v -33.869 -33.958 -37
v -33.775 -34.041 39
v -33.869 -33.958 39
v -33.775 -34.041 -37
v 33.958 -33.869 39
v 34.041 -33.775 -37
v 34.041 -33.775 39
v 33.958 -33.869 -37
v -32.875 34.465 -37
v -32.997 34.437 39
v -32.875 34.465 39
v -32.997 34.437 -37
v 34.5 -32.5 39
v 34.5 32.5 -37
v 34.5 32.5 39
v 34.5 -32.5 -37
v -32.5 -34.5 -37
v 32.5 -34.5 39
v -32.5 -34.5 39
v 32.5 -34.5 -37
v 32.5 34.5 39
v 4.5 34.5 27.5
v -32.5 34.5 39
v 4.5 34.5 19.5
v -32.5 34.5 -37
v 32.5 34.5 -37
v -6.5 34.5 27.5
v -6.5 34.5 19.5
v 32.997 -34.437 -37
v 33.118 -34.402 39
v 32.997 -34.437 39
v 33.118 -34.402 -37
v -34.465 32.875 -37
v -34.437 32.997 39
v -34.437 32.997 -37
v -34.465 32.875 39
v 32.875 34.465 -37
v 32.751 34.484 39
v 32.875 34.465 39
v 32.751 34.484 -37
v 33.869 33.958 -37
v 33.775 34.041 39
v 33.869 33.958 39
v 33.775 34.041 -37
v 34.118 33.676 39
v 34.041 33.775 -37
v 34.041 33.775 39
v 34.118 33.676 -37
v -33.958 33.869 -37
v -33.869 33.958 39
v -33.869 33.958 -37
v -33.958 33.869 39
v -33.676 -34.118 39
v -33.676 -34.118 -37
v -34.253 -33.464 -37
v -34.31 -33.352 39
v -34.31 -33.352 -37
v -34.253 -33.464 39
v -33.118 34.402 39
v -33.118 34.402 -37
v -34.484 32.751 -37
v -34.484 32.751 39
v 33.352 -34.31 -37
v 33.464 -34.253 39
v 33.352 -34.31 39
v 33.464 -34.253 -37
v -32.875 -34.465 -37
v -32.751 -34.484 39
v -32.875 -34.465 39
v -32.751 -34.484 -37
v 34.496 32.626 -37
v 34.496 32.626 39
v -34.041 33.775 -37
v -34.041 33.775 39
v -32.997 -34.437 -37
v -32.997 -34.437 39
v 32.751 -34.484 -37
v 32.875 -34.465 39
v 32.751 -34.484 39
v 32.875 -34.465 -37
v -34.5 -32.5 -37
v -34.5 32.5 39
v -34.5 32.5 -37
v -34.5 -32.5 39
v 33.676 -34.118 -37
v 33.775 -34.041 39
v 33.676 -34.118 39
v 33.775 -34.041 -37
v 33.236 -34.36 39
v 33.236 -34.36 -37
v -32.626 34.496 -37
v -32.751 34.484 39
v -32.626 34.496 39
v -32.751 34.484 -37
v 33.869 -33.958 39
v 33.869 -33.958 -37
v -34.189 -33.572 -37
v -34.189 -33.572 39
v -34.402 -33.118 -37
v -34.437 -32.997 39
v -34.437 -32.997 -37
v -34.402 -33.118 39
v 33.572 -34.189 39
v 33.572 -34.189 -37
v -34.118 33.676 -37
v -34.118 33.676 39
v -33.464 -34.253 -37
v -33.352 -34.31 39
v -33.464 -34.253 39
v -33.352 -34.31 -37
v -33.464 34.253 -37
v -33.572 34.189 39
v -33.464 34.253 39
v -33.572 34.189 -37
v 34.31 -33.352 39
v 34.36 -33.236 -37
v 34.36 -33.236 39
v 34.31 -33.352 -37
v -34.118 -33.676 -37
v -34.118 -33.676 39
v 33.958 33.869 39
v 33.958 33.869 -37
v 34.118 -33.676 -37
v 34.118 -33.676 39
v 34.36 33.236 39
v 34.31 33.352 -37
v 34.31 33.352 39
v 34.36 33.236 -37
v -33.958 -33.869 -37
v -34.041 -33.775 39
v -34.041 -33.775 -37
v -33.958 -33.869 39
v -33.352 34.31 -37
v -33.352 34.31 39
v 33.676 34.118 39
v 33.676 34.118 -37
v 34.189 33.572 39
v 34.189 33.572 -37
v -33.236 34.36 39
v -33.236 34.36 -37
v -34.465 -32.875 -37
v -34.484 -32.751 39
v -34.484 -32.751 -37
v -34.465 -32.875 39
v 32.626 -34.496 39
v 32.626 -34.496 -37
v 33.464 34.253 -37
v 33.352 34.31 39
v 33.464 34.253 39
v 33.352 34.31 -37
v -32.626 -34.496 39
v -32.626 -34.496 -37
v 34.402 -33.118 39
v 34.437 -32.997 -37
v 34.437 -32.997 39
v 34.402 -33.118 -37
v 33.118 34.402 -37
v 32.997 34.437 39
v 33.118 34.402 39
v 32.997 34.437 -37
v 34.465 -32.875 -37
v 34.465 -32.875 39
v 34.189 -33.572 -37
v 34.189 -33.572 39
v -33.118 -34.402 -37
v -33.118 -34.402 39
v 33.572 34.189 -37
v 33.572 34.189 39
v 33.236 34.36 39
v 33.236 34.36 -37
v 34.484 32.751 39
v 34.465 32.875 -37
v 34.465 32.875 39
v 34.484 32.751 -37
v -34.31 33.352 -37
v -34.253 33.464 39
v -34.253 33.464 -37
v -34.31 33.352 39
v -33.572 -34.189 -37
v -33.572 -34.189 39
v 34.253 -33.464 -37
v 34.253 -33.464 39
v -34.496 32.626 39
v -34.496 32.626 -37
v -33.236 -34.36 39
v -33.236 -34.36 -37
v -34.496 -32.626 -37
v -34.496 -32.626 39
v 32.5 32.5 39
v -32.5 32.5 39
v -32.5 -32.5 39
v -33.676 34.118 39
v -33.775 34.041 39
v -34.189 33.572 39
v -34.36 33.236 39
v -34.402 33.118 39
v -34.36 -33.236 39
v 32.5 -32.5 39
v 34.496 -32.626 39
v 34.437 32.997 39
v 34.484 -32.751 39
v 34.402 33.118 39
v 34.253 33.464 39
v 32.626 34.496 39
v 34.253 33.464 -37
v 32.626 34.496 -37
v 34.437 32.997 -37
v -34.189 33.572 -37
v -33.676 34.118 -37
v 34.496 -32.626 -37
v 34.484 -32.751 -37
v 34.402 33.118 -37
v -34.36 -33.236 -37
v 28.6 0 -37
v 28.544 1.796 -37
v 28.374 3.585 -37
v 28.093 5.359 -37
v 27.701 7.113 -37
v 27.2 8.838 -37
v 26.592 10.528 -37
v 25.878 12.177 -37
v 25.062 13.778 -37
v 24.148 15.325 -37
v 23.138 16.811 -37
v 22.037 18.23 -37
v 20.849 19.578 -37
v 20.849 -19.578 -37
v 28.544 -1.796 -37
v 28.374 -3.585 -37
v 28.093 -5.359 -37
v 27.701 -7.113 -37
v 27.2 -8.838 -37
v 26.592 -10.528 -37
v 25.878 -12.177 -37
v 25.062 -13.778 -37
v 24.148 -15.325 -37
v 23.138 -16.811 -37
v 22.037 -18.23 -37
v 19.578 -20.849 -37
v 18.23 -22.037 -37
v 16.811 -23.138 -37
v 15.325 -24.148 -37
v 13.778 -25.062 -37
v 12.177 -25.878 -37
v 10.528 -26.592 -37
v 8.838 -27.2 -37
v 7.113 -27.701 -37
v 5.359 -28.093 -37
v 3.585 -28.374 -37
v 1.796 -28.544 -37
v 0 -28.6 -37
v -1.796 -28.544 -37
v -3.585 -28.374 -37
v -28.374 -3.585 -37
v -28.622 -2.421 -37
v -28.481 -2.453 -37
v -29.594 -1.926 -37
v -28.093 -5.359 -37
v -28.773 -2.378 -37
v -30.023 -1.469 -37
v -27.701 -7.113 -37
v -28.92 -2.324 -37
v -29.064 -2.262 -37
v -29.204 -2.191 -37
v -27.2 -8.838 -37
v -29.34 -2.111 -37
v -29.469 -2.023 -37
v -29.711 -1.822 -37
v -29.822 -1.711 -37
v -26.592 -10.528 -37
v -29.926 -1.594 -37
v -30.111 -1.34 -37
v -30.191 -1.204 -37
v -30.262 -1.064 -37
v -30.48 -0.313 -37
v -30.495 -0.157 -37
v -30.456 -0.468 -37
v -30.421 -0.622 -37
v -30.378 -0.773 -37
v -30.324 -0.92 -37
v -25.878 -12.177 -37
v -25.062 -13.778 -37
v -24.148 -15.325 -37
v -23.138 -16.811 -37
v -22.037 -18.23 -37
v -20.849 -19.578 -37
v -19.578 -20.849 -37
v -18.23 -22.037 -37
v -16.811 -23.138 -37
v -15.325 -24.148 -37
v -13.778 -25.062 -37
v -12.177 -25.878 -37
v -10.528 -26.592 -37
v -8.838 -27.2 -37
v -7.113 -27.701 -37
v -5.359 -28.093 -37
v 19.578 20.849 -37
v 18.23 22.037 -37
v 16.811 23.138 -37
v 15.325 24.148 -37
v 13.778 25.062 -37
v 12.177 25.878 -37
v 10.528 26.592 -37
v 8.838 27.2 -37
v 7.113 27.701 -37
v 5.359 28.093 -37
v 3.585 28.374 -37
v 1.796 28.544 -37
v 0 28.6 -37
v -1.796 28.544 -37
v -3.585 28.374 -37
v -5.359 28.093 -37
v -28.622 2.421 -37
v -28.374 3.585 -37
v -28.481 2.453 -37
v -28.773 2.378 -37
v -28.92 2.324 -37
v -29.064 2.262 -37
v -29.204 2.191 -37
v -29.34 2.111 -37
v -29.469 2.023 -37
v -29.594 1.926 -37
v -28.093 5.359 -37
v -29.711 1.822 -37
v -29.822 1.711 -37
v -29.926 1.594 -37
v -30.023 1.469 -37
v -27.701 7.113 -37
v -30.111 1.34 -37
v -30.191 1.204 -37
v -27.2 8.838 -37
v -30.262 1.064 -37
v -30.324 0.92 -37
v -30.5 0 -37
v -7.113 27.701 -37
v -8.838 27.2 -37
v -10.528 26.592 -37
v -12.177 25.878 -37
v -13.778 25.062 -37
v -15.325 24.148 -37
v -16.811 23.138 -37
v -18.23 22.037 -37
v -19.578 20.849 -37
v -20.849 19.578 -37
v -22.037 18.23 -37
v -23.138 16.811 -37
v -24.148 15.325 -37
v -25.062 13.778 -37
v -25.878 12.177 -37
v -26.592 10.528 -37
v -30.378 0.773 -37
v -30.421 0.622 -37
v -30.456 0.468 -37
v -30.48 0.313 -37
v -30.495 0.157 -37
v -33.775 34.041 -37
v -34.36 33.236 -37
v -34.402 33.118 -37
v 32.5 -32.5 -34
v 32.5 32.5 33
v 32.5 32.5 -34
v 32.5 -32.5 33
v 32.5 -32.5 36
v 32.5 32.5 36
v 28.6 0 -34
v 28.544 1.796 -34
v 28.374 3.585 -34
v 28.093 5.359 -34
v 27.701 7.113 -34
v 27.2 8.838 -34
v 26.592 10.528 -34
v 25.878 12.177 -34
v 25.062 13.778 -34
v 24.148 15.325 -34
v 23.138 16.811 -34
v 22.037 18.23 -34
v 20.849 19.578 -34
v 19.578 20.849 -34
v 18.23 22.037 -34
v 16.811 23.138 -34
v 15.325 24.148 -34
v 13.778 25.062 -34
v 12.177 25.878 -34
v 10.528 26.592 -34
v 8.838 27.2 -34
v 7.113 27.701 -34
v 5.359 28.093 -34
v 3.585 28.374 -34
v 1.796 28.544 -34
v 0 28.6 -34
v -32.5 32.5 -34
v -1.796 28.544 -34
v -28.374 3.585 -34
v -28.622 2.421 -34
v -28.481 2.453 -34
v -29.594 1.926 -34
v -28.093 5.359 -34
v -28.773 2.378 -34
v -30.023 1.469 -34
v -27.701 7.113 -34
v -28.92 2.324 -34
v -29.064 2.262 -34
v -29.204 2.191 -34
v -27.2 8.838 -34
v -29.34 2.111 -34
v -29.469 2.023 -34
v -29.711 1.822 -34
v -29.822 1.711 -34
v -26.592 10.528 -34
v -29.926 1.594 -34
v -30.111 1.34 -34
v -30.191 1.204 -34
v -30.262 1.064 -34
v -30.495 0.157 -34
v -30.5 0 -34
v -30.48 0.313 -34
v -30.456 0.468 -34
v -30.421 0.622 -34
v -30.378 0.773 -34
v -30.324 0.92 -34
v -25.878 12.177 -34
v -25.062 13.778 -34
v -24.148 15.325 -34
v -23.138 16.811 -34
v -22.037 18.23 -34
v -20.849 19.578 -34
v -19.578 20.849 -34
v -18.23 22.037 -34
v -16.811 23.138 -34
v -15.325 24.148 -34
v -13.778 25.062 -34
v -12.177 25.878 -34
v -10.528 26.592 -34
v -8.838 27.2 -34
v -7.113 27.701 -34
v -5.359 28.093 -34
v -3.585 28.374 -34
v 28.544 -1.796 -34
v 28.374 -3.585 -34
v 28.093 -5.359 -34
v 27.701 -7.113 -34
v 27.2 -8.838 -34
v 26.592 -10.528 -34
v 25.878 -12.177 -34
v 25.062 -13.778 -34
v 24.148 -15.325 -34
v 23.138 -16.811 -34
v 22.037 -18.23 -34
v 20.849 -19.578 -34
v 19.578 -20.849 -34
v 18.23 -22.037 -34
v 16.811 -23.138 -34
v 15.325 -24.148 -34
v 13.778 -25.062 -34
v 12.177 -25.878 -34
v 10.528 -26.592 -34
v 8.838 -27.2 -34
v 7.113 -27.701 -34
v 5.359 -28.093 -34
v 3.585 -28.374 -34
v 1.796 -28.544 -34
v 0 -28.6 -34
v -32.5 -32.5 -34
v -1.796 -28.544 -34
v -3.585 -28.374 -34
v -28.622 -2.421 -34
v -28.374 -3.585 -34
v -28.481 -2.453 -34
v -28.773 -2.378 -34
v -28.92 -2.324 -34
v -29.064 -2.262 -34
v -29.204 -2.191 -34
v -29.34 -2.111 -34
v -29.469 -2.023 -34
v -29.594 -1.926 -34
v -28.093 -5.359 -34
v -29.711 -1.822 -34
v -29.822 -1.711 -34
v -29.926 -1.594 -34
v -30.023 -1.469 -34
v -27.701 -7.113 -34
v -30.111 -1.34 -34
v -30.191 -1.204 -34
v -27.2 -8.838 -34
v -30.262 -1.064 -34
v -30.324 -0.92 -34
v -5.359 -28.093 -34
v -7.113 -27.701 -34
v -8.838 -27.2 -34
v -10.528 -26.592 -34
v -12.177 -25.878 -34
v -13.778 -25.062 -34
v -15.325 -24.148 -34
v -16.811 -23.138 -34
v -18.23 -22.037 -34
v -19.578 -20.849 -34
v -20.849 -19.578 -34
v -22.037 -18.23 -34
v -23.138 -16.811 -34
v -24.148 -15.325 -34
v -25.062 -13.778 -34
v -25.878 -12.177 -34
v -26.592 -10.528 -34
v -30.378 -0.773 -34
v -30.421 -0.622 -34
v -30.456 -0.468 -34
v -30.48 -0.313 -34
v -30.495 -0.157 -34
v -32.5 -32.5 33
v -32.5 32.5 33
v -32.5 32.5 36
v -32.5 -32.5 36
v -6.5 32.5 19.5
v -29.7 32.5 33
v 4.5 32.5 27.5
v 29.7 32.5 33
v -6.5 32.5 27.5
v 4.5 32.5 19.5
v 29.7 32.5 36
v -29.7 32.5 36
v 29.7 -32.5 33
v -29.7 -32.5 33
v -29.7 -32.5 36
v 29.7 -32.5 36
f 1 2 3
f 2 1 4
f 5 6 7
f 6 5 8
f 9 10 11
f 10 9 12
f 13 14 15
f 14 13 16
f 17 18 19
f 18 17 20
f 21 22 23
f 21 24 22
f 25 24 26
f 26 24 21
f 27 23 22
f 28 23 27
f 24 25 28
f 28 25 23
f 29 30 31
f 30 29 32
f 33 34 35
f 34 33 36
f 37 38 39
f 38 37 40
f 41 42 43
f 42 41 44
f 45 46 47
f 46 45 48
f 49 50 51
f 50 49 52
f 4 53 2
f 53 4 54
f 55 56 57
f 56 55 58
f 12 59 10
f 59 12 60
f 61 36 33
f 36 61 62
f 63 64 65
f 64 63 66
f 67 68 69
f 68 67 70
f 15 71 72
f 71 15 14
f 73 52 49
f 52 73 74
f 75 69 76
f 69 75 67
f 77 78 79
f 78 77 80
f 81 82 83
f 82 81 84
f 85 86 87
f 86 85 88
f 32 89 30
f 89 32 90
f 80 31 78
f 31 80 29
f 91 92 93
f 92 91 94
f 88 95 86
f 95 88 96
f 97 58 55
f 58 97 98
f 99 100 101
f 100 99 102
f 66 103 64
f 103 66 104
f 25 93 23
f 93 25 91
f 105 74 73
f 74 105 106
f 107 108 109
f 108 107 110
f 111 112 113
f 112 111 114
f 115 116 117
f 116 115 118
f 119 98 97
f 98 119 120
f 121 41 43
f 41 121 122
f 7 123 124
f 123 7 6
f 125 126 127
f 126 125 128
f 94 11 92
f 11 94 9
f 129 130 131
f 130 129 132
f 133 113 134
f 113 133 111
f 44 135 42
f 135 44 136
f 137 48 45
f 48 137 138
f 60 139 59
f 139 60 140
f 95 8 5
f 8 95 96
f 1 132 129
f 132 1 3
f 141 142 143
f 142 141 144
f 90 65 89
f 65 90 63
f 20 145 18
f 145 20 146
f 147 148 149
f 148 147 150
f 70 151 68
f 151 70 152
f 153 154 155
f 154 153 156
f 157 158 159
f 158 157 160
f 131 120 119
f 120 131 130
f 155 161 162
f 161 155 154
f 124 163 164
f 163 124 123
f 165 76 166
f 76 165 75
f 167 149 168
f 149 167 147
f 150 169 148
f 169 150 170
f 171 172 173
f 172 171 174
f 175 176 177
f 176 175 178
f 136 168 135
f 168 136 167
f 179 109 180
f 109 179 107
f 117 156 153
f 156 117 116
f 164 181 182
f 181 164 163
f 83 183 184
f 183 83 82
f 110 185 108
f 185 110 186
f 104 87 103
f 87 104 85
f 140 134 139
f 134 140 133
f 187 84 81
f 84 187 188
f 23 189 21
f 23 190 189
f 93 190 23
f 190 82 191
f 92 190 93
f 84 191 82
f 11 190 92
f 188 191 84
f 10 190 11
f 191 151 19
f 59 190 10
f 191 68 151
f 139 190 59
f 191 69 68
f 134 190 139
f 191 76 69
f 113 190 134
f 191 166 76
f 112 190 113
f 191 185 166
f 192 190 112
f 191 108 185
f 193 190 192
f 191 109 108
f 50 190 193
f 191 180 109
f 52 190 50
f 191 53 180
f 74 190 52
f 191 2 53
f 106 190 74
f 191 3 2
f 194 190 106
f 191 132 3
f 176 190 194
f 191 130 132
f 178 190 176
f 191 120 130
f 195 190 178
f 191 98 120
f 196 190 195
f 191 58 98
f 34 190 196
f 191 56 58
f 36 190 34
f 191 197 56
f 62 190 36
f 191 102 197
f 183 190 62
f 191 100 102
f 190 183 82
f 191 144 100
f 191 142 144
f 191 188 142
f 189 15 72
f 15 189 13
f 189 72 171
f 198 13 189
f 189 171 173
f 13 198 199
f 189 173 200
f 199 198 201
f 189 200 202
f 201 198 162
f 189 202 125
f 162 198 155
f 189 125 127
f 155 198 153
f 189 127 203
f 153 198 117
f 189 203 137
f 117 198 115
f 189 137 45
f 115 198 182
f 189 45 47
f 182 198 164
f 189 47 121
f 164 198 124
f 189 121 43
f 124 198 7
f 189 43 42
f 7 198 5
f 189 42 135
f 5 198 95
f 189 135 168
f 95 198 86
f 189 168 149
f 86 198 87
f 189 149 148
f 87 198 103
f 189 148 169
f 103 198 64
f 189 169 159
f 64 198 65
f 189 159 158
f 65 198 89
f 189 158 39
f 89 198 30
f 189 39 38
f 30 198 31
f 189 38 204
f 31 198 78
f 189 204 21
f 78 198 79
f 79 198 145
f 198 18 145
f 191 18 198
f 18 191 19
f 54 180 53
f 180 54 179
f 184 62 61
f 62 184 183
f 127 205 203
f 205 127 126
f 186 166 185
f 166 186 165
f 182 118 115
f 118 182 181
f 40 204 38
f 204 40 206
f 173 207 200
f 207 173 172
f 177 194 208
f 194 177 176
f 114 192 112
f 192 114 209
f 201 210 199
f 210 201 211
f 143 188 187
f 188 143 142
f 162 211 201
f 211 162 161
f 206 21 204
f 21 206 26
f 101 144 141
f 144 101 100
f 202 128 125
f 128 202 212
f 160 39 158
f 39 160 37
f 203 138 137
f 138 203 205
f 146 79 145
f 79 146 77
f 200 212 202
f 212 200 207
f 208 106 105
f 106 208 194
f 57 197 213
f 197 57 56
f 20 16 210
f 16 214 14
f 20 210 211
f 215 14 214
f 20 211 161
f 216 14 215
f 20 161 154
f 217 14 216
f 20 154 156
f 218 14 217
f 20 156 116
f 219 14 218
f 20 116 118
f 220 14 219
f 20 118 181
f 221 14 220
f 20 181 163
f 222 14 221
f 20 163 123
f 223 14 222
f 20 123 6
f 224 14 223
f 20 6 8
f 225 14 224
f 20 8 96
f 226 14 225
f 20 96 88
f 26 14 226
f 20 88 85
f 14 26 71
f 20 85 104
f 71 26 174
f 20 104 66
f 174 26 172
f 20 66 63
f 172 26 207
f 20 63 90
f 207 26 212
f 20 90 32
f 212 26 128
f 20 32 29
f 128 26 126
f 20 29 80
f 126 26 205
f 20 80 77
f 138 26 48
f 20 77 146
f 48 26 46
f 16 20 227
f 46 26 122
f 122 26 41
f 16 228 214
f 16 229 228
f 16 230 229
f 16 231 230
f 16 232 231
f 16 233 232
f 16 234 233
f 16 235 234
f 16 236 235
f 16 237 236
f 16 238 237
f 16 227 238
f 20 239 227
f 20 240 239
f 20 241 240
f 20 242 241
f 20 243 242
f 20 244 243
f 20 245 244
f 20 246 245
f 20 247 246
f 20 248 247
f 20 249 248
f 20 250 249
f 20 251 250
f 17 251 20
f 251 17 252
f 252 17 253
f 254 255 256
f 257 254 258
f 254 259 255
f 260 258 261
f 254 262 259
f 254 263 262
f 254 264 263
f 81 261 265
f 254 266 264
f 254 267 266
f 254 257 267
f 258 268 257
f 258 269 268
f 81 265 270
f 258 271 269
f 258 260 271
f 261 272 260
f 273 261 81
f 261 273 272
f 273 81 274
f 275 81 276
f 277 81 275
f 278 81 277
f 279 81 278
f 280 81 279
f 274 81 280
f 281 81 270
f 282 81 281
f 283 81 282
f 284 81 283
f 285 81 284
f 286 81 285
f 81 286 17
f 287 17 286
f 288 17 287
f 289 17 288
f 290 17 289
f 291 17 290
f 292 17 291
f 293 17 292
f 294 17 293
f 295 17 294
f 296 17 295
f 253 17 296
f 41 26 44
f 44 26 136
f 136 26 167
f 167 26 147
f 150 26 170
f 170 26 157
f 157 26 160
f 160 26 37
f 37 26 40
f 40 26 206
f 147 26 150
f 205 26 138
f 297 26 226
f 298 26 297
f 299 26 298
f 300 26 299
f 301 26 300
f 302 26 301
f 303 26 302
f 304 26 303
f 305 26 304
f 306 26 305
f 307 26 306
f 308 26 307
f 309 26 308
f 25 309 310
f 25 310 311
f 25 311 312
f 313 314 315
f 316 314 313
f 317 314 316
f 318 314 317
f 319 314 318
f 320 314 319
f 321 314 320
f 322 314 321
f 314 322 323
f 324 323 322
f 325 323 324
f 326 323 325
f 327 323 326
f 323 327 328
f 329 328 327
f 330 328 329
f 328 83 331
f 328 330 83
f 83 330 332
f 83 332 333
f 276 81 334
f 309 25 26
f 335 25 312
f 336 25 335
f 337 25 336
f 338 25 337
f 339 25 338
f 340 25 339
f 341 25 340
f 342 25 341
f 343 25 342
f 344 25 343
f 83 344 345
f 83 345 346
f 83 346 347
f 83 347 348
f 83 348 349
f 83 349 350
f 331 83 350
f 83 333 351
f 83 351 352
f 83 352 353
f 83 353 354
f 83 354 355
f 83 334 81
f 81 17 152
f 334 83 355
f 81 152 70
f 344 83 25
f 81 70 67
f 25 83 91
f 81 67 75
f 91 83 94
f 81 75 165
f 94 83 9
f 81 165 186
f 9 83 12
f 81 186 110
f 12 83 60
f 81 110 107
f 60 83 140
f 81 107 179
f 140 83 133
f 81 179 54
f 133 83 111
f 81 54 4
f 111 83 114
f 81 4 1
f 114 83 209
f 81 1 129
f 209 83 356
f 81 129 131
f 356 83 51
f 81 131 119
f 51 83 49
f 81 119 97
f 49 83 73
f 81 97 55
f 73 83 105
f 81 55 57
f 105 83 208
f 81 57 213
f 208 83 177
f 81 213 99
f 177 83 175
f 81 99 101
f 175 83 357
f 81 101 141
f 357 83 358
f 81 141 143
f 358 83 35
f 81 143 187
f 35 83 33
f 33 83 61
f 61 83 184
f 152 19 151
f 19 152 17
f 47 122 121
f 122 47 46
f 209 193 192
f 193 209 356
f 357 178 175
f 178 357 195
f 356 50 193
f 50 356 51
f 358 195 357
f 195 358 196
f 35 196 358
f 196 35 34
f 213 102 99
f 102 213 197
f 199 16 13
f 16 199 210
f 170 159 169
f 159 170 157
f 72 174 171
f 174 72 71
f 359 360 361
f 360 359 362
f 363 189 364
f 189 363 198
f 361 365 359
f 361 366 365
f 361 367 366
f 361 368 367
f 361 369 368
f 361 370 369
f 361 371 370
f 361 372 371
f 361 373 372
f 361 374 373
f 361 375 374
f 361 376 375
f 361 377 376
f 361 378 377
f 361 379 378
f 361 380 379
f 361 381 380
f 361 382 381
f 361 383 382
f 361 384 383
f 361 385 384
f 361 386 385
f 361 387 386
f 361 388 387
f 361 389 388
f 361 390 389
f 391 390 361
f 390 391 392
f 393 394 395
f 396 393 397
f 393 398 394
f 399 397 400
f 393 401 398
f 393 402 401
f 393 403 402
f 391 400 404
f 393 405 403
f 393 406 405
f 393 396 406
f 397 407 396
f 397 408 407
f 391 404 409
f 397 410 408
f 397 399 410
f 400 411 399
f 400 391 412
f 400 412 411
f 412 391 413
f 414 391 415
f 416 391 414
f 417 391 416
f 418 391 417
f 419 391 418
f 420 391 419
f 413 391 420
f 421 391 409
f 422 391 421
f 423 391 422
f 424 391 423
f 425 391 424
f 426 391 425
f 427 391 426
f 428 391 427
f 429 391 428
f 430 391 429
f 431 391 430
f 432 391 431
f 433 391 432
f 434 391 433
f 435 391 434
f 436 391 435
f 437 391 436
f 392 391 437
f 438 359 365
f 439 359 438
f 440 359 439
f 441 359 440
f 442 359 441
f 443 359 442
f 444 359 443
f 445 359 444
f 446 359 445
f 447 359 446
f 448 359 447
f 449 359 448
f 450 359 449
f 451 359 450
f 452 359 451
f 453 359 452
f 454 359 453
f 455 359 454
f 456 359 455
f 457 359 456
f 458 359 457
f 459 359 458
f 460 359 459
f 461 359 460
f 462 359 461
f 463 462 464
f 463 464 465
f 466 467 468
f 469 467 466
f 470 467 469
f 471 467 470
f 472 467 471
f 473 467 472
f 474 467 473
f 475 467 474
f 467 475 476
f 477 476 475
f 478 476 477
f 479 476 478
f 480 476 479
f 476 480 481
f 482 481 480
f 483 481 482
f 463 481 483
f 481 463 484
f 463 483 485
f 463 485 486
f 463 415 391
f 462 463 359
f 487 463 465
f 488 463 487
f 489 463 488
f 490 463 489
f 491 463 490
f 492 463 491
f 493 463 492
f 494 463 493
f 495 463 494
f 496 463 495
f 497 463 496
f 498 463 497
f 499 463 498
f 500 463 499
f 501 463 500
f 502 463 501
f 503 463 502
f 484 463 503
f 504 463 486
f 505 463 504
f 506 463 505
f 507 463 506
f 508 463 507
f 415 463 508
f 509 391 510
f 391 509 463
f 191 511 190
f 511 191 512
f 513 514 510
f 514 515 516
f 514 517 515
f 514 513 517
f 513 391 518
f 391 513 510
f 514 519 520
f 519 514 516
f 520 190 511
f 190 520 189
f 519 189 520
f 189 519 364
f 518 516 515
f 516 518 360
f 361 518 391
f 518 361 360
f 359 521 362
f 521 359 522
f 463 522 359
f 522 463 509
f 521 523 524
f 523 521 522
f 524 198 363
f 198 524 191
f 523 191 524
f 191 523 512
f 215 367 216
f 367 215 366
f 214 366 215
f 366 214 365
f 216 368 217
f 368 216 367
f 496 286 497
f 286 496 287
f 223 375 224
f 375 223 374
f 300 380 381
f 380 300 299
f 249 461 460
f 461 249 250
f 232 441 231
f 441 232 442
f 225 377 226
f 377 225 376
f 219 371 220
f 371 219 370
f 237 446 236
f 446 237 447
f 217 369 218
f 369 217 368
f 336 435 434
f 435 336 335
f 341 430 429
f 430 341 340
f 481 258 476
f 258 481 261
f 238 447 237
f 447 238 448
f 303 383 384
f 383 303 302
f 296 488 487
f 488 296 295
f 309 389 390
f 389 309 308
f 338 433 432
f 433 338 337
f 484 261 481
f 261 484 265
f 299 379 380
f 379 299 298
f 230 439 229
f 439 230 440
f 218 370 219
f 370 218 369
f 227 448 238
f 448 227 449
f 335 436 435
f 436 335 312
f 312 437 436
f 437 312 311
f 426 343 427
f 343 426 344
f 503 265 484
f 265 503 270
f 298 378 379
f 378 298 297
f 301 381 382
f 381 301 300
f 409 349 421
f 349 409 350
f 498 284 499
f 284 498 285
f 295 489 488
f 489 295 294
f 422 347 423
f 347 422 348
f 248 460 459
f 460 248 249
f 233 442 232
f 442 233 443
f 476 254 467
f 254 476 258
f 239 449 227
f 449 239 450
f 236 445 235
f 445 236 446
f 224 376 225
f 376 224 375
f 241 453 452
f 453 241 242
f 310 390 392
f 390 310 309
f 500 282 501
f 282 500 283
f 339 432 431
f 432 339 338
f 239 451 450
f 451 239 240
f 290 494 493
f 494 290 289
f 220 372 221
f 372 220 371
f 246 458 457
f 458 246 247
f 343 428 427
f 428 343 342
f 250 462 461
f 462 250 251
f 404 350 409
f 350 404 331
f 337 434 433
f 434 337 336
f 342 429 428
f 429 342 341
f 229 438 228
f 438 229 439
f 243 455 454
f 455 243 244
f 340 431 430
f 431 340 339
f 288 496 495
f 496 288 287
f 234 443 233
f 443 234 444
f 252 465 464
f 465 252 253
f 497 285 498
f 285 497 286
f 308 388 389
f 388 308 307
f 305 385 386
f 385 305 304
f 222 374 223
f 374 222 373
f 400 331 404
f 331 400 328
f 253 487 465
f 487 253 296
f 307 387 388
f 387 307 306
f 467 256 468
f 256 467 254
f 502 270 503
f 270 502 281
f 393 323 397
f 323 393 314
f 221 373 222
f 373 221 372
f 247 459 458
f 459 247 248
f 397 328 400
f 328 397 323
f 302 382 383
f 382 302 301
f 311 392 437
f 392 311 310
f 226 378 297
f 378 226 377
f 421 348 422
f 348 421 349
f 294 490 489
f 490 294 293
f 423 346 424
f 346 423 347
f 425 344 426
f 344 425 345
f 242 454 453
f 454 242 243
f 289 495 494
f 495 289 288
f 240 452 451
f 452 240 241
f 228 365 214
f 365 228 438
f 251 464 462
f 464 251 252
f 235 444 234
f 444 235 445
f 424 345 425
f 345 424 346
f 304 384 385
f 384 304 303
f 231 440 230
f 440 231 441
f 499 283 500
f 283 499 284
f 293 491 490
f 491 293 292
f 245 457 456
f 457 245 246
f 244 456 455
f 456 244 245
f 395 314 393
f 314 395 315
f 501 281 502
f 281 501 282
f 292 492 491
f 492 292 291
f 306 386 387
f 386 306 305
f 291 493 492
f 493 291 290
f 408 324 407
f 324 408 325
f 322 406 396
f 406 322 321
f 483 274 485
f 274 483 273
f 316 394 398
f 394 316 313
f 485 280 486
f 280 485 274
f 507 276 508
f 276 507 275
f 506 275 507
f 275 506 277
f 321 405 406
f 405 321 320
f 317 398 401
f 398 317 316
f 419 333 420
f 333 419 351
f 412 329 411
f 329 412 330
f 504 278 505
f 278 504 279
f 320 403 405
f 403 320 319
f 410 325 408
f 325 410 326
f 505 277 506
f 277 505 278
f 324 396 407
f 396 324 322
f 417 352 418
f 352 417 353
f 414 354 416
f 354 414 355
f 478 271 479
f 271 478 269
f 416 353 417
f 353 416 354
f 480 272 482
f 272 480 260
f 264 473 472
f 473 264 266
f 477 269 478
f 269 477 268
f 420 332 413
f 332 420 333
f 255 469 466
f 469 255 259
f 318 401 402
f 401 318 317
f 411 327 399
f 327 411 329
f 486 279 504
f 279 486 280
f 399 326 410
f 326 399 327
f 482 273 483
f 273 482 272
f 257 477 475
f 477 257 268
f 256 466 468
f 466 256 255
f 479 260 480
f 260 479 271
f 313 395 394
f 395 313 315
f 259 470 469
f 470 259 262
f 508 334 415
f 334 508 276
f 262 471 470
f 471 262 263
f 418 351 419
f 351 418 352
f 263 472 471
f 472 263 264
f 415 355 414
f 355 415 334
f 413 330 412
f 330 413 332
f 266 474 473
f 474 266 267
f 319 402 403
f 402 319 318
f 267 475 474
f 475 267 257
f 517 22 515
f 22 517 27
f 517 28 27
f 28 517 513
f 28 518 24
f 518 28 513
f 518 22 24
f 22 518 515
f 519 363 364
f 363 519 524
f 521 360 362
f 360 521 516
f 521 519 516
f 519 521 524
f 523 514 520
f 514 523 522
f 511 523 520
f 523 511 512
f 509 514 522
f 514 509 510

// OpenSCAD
/* Diseño de una caja en 3D */

// Variables con las medidas de la caja (en mm)
largoCaja=65;
anchoCaja=65;
grosorCaja=74;

// Hace la unión de todo lo que está en la función de diferencia y las figuras a partir de la linea 38.
union () {
    
    // Hace la diferencia (resta) de arriba hacia abajo
    difference(){
            
             // Función para crear un cubo
             minkowski() {
                cube([largoCaja,anchoCaja,grosorCaja], center=true);
                cylinder(r=2,h=2, $fn=100);
            }
        
            // Coloco lo que voy a restar 2mm hacia arriba en Z para que haga de fondo
            translate([0,0,3])
            cube([65, 65, 74], center=true);
            
            // Hueco botón arcade grande
            translate([0, 0, -35])
            #cylinder (r=28.6, h=10, $fn=100, center=true);
            
            // Hueco mueca botón arcade
            translate([-28, 0, -35])
            #cylinder (r=2.5, h=10, $fn=100, center=true);
     
            // Hueco USB
            rotate([0, 0, 90])
            translate([33,1, 23.5])
            #cube([5, 11, 8], center=true);
    }

    color([1, 0, 0])
    translate([31.2, 0, 34.5])
    cube ([3, 65, 3], center = true);
    
    translate([-31.2, 0, 34.5])
    cube ([3, 65, 3], center = true);

}
